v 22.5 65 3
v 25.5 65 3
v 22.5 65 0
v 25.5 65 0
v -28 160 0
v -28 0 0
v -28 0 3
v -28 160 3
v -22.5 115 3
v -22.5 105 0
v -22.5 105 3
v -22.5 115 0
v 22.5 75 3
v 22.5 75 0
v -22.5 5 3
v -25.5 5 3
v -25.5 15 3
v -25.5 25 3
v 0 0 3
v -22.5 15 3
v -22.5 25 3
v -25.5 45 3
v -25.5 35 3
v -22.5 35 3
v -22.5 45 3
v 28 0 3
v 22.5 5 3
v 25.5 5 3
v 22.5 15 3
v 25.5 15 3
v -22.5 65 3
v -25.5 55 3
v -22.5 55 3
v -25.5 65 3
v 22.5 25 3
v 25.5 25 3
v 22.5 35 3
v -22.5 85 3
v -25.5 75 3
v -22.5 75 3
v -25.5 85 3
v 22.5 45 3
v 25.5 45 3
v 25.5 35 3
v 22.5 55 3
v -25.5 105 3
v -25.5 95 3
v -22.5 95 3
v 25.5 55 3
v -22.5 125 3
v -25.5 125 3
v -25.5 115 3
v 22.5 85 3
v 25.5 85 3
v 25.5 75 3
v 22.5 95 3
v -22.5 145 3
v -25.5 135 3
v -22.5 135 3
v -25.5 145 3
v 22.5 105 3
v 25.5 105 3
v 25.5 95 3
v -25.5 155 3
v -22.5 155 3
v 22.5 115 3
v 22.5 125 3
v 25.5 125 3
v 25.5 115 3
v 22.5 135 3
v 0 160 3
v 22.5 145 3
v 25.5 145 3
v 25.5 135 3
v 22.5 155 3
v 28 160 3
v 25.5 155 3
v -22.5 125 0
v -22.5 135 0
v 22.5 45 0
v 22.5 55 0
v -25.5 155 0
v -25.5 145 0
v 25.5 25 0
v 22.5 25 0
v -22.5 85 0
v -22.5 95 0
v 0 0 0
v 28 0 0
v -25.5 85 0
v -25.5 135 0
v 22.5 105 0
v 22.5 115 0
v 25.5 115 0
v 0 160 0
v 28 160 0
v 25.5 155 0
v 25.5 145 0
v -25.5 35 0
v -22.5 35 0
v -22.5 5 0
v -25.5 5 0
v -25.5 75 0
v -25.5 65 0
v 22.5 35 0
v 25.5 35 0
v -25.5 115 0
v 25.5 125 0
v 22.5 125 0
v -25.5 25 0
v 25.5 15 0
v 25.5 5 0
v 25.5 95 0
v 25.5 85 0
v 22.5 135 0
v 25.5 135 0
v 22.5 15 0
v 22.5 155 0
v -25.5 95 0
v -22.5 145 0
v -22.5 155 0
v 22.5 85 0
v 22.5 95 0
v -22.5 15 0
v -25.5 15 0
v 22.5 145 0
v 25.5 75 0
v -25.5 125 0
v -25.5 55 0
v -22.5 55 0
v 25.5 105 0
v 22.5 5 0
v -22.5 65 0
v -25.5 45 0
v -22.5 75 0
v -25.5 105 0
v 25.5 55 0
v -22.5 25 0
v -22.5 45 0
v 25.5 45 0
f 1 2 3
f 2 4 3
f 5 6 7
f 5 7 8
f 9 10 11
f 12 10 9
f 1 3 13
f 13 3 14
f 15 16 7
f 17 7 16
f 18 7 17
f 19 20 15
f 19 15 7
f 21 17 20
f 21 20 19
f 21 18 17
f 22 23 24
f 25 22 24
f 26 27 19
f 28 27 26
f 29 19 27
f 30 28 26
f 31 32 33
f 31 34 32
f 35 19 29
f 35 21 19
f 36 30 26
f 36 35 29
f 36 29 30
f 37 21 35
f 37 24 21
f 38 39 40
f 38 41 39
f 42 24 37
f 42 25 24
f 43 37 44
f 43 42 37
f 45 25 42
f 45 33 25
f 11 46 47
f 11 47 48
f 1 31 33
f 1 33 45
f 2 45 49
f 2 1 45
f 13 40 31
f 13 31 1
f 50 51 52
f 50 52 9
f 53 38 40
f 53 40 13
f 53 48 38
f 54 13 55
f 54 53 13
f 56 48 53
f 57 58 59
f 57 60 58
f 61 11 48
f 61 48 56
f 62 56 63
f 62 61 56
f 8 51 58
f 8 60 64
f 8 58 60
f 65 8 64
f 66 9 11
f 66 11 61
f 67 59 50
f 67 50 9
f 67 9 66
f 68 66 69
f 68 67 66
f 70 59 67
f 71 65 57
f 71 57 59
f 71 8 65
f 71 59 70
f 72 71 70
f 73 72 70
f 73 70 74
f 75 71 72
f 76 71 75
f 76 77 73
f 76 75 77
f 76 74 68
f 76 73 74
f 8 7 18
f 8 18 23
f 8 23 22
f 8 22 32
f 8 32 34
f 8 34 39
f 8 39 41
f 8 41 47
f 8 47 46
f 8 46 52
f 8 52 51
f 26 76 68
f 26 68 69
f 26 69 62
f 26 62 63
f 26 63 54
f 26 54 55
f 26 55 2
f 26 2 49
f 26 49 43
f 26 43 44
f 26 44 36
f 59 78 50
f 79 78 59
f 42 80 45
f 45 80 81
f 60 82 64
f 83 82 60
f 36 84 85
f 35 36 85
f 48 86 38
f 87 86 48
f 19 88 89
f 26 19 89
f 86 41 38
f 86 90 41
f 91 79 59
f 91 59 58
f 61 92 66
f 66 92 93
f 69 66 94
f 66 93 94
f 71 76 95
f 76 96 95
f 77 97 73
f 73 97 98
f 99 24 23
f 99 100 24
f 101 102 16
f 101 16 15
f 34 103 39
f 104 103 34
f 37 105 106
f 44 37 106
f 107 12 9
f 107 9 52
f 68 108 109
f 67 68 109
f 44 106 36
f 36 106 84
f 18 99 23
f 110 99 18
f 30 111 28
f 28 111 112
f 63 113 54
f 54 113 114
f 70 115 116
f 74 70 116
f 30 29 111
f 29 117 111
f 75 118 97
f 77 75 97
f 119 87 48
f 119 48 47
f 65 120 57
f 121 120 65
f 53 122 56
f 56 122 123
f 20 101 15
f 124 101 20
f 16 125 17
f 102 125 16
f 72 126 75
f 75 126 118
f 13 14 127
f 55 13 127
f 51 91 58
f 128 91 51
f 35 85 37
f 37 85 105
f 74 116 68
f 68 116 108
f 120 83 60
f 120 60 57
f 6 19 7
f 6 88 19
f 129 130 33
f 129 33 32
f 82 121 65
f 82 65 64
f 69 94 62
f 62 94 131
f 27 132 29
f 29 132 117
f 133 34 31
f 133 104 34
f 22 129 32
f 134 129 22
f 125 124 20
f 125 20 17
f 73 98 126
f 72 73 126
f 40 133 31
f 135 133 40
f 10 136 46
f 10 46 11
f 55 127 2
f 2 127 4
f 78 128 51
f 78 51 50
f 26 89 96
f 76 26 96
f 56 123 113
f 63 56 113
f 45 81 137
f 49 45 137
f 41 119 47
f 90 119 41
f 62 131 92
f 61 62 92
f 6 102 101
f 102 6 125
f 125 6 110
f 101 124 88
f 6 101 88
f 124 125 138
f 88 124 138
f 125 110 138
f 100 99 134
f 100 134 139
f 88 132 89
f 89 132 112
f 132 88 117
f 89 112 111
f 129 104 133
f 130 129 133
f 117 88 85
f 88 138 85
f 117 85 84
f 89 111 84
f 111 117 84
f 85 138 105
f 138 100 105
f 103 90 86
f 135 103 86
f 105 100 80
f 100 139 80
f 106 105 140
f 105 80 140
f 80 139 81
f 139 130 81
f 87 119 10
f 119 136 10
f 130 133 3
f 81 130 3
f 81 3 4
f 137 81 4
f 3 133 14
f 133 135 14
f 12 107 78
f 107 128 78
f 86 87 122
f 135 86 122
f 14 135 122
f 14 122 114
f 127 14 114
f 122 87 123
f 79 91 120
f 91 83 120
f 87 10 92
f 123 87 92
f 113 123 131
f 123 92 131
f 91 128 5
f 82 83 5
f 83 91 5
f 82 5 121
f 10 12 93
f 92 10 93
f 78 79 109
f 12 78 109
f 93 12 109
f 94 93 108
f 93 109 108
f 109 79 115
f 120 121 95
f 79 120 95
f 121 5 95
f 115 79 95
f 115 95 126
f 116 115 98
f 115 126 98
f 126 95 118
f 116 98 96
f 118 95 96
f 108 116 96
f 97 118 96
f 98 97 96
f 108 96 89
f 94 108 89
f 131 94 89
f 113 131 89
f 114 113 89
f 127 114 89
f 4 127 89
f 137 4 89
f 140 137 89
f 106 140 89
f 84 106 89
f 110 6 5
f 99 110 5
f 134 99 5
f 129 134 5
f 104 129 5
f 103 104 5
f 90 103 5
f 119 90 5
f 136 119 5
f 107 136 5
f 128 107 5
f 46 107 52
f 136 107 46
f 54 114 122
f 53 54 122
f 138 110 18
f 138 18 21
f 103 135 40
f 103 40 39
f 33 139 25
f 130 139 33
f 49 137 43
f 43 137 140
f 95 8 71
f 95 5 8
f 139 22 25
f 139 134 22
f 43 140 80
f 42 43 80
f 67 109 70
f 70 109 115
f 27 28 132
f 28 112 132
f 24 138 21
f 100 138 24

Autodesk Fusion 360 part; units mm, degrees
sketch "Sketch1" plane through (0, 0, 0) normal (0, 0, 1) x (1, 0, 0)
  line L0 (0, 0) -> (28, 0)
  line L1 (28, 0) -> (28, 160)
  line L2 (28, 160) -> (0, 160)
  line L3 (0, 160) -> (0, 0) construction
  line L4 (20, 0) -> (20, 160) construction
  line L5 (22.5, 155) -> (25.5, 155)
  line L6 (25.5, 155) -> (25.5, 145)
  line L7 (25.5, 145) -> (22.5, 145)
  line L8 (22.5, 145) -> (22.5, 155)
  line L9 (25.5, 155) -> (25.5, 160) construction
  line L10 (25.5, 155) -> (28, 155) construction
  line L11 (22.5, 135) -> (25.5, 135)
  line L12 (25.5, 135) -> (25.5, 125)
  line L13 (25.5, 125) -> (22.5, 125)
  line L14 (22.5, 125) -> (22.5, 135)
  line L15 (24, 145) -> (24, 135) construction
  line L16 (22.5, 105) -> (22.5, 115)
  line L17 (25.5, 105) -> (22.5, 105)
  line L18 (25.5, 115) -> (25.5, 105)
  line L19 (22.5, 115) -> (25.5, 115)
  line L20 (24, 115) -> (24, 125) construction
  line L21 (25.5, 95) -> (25.5, 85)
  line L22 (25.5, 85) -> (22.5, 85)
  line L23 (22.5, 85) -> (22.5, 95)
  line L24 (22.5, 95) -> (25.5, 95)
  line L25 (24, 95) -> (24, 105) construction
  line L26 (25.5, 95) -> (28, 95) construction
  line L27 (22.5, 75) -> (25.5, 75)
  line L28 (25.5, 75) -> (25.5, 65)
  line L29 (25.5, 65) -> (22.5, 65)
  line L30 (22.5, 65) -> (22.5, 75)
  line L31 (22.5, 55) -> (25.5, 55)
  line L32 (25.5, 55) -> (25.5, 45)
  line L33 (25.5, 45) -> (22.5, 45)
  line L34 (22.5, 45) -> (22.5, 55)
  line L35 (24, 85) -> (24, 75) construction
  line L36 (25.5, 75) -> (28, 75) construction
  line L37 (25.5, 55) -> (28, 55) construction
  line L38 (24, 55) -> (24, 65) construction
  line L39 (25.5, 135) -> (28, 135) construction
  line L40 (25.5, 115) -> (28, 115) construction
  line L41 (22.5, 35) -> (25.5, 35)
  line L42 (25.5, 35) -> (25.5, 25)
  line L43 (25.5, 25) -> (22.5, 25)
  line L44 (22.5, 25) -> (22.5, 35)
  line L45 (25.5, 35) -> (28, 35) construction
  line L46 (24, 45) -> (24, 35) construction
  line L47 (22.5, 15) -> (25.5, 15)
  line L48 (25.5, 15) -> (25.5, 5)
  line L49 (25.5, 5) -> (22.5, 5)
  line L50 (22.5, 5) -> (22.5, 15)
  line L51 (24, 15) -> (24, 25) construction
  line L52 (25.5, 15) -> (28, 15) construction
  line L53 (-25.5, 75) -> (-28, 75) construction
  line L54 (-25.5, 75) -> (-25.5, 65)
  line L55 (-20, 0) -> (-20, 160) construction
  line L56 (-24, 85) -> (-24, 75) construction
  line L57 (-25.5, 115) -> (-28, 115) construction
  line L58 (-22.5, 45) -> (-22.5, 55)
  line L59 (-25.5, 145) -> (-22.5, 145)
  line L60 (-25.5, 135) -> (-28, 135) construction
  line L61 (-22.5, 115) -> (-25.5, 115)
  line L62 (-25.5, 105) -> (-22.5, 105)
  line L63 (-22.5, 65) -> (-22.5, 75)
  line L64 (0, 160) -> (0, 0) construction
  line L65 (-24, 45) -> (-24, 35) construction
  line L66 (-25.5, 135) -> (-25.5, 125)
  line L67 (-28, 160) -> (0, 160)
  line L68 (-25.5, 155) -> (-28, 155) construction
  line L69 (-25.5, 125) -> (-22.5, 125)
  line L70 (-25.5, 55) -> (-28, 55) construction
  line L71 (-24, 15) -> (-24, 25) construction
  line L72 (-22.5, 135) -> (-25.5, 135)
  line L73 (-25.5, 15) -> (-28, 15) construction
  line L74 (-22.5, 75) -> (-25.5, 75)
  line L75 (-25.5, 115) -> (-25.5, 105)
  line L76 (-25.5, 155) -> (-25.5, 145)
  line L77 (-22.5, 105) -> (-22.5, 115)
  line L78 (-24, 115) -> (-24, 125) construction
  line L79 (-25.5, 95) -> (-25.5, 85)
  line L80 (-25.5, 55) -> (-25.5, 45)
  line L81 (-28, 0) -> (-28, 160)
  line L82 (-22.5, 155) -> (-25.5, 155)
  line L83 (-22.5, 85) -> (-22.5, 95)
  line L84 (-24, 95) -> (-24, 105) construction
  line L85 (-25.5, 15) -> (-25.5, 5)
  line L86 (-25.5, 5) -> (-22.5, 5)
  line L87 (-25.5, 155) -> (-25.5, 160) construction
  line L88 (-25.5, 35) -> (-28, 35) construction
  line L89 (-22.5, 25) -> (-22.5, 35)
  line L90 (-22.5, 35) -> (-25.5, 35)
  line L91 (-25.5, 95) -> (-28, 95) construction
  line L92 (-25.5, 25) -> (-22.5, 25)
  line L93 (-22.5, 95) -> (-25.5, 95)
  line L94 (-25.5, 45) -> (-22.5, 45)
  line L95 (-22.5, 125) -> (-22.5, 135)
  line L96 (-22.5, 145) -> (-22.5, 155)
  line L97 (-24, 145) -> (-24, 135) construction
  line L98 (-22.5, 55) -> (-25.5, 55)
  line L99 (-25.5, 65) -> (-22.5, 65)
  line L100 (-25.5, 85) -> (-22.5, 85)
  line L101 (-24, 55) -> (-24, 65) construction
  line L102 (-25.5, 35) -> (-25.5, 25)
  line L103 (0, 0) -> (-28, 0)
  line L104 (-22.5, 15) -> (-25.5, 15)
  line L105 (-22.5, 5) -> (-22.5, 15)
  point P0 (24, 115)
  point P1 (24, 95)
  point P2 (24, 95)
  point P3 (-24, 115)
  point P4 (-24, 95)
  point P5 (-24, 95)
  dimension "d3" = 160
  dimension "d4" = 28
  dimension "d5" = 5
  dimension "d6" = 2.5
  dimension "d7" = 10
  dimension "d8" = 3
  dimension "d9" = 10
extrude "Extrude1" add sketch "Sketch1" along normal blind 3
sketch "Sketch2" plane through (0, 0, 3) normal (0, 0, 1) x (-1, 0, 0)
  line L0 (-22.5, -105) -> (-22.5, -115)
  line L1 (-22.5, -115) -> (-25.5, -115)
  line L2 (-25.5, -115) -> (-25.5, -105)
  line L3 (-25.5, -105) -> (-22.5, -105)
  line L4 (-22.5, -85) -> (-22.5, -95)
  line L5 (-22.5, -95) -> (-25.5, -95)
  line L6 (-25.5, -95) -> (-25.5, -85)
  line L7 (-25.5, -85) -> (-22.5, -85)
  line L8 (-25.5, -145) -> (-22.5, -145)
  line L9 (-22.5, -145) -> (-22.5, -155)
  line L10 (-22.5, -155) -> (-25.5, -155)
  line L11 (-25.5, -155) -> (-25.5, -145)
  line L12 (-25.5, -65) -> (-22.5, -65)
  line L13 (-22.5, -65) -> (-22.5, -75)
  line L14 (-22.5, -75) -> (-25.5, -75)
  line L15 (-25.5, -75) -> (-25.5, -65)
  line L16 (-25.5, -125) -> (-22.5, -125)
  line L17 (-22.5, -125) -> (-22.5, -135)
  line L18 (-22.5, -135) -> (-25.5, -135)
  line L19 (-25.5, -135) -> (-25.5, -125)
  line L20 (-25.5, -25) -> (-22.5, -25)
  line L21 (-22.5, -25) -> (-22.5, -35)
  line L22 (-22.5, -35) -> (-25.5, -35)
  line L23 (-25.5, -35) -> (-25.5, -25)
  line L24 (-25.5, -5) -> (-22.5, -5)
  line L25 (-22.5, -5) -> (-22.5, -15)
  line L26 (-22.5, -15) -> (-25.5, -15)
  line L27 (-25.5, -15) -> (-25.5, -5)
  line L28 (22.5, -115) -> (22.5, -105)
  line L29 (22.5, -105) -> (25.5, -105)
  line L30 (25.5, -105) -> (25.5, -115)
  line L31 (25.5, -115) -> (22.5, -115)
  line L32 (22.5, -15) -> (22.5, -5)
  line L33 (22.5, -5) -> (25.5, -5)
  line L34 (25.5, -5) -> (25.5, -15)
  line L35 (25.5, -15) -> (22.5, -15)
  line L36 (25.5, -25) -> (25.5, -35)
  line L37 (25.5, -35) -> (22.5, -35)
  line L38 (22.5, -35) -> (22.5, -25)
  line L39 (22.5, -25) -> (25.5, -25)
  line L40 (22.5, -85) -> (25.5, -85)
  line L41 (25.5, -85) -> (25.5, -95)
  line L42 (25.5, -95) -> (22.5, -95)
  line L43 (22.5, -95) -> (22.5, -85)
  line L44 (22.5, -65) -> (25.5, -65)
  line L45 (25.5, -65) -> (25.5, -75)
  line L46 (25.5, -75) -> (22.5, -75)
  line L47 (22.5, -75) -> (22.5, -65)
  line L48 (25.5, -55) -> (22.5, -55)
  line L49 (22.5, -55) -> (22.5, -45)
  line L50 (22.5, -45) -> (25.5, -45)
  line L51 (25.5, -45) -> (25.5, -55)
  line L52 (22.5, -155) -> (22.5, -145)
  line L53 (22.5, -145) -> (25.5, -145)
  line L54 (25.5, -145) -> (25.5, -155)
  line L55 (25.5, -155) -> (22.5, -155)
  line L56 (22.5, -135) -> (22.5, -125)
  line L57 (22.5, -125) -> (25.5, -125)
  line L58 (25.5, -125) -> (25.5, -135)
  line L59 (25.5, -135) -> (22.5, -135)
  line L60 (-25.5, -45) -> (-22.5, -45)
  line L61 (-22.5, -45) -> (-22.5, -55)
  line L62 (-22.5, -55) -> (-25.5, -55)
  line L63 (-25.5, -55) -> (-25.5, -45)
  line L64 (-28, 0) -> (-28, -160)
  line L65 (-28, -160) -> (28, -160)
  line L66 (28, -160) -> (28, 0)
  line L67 (28, 0) -> (-28, 0)
